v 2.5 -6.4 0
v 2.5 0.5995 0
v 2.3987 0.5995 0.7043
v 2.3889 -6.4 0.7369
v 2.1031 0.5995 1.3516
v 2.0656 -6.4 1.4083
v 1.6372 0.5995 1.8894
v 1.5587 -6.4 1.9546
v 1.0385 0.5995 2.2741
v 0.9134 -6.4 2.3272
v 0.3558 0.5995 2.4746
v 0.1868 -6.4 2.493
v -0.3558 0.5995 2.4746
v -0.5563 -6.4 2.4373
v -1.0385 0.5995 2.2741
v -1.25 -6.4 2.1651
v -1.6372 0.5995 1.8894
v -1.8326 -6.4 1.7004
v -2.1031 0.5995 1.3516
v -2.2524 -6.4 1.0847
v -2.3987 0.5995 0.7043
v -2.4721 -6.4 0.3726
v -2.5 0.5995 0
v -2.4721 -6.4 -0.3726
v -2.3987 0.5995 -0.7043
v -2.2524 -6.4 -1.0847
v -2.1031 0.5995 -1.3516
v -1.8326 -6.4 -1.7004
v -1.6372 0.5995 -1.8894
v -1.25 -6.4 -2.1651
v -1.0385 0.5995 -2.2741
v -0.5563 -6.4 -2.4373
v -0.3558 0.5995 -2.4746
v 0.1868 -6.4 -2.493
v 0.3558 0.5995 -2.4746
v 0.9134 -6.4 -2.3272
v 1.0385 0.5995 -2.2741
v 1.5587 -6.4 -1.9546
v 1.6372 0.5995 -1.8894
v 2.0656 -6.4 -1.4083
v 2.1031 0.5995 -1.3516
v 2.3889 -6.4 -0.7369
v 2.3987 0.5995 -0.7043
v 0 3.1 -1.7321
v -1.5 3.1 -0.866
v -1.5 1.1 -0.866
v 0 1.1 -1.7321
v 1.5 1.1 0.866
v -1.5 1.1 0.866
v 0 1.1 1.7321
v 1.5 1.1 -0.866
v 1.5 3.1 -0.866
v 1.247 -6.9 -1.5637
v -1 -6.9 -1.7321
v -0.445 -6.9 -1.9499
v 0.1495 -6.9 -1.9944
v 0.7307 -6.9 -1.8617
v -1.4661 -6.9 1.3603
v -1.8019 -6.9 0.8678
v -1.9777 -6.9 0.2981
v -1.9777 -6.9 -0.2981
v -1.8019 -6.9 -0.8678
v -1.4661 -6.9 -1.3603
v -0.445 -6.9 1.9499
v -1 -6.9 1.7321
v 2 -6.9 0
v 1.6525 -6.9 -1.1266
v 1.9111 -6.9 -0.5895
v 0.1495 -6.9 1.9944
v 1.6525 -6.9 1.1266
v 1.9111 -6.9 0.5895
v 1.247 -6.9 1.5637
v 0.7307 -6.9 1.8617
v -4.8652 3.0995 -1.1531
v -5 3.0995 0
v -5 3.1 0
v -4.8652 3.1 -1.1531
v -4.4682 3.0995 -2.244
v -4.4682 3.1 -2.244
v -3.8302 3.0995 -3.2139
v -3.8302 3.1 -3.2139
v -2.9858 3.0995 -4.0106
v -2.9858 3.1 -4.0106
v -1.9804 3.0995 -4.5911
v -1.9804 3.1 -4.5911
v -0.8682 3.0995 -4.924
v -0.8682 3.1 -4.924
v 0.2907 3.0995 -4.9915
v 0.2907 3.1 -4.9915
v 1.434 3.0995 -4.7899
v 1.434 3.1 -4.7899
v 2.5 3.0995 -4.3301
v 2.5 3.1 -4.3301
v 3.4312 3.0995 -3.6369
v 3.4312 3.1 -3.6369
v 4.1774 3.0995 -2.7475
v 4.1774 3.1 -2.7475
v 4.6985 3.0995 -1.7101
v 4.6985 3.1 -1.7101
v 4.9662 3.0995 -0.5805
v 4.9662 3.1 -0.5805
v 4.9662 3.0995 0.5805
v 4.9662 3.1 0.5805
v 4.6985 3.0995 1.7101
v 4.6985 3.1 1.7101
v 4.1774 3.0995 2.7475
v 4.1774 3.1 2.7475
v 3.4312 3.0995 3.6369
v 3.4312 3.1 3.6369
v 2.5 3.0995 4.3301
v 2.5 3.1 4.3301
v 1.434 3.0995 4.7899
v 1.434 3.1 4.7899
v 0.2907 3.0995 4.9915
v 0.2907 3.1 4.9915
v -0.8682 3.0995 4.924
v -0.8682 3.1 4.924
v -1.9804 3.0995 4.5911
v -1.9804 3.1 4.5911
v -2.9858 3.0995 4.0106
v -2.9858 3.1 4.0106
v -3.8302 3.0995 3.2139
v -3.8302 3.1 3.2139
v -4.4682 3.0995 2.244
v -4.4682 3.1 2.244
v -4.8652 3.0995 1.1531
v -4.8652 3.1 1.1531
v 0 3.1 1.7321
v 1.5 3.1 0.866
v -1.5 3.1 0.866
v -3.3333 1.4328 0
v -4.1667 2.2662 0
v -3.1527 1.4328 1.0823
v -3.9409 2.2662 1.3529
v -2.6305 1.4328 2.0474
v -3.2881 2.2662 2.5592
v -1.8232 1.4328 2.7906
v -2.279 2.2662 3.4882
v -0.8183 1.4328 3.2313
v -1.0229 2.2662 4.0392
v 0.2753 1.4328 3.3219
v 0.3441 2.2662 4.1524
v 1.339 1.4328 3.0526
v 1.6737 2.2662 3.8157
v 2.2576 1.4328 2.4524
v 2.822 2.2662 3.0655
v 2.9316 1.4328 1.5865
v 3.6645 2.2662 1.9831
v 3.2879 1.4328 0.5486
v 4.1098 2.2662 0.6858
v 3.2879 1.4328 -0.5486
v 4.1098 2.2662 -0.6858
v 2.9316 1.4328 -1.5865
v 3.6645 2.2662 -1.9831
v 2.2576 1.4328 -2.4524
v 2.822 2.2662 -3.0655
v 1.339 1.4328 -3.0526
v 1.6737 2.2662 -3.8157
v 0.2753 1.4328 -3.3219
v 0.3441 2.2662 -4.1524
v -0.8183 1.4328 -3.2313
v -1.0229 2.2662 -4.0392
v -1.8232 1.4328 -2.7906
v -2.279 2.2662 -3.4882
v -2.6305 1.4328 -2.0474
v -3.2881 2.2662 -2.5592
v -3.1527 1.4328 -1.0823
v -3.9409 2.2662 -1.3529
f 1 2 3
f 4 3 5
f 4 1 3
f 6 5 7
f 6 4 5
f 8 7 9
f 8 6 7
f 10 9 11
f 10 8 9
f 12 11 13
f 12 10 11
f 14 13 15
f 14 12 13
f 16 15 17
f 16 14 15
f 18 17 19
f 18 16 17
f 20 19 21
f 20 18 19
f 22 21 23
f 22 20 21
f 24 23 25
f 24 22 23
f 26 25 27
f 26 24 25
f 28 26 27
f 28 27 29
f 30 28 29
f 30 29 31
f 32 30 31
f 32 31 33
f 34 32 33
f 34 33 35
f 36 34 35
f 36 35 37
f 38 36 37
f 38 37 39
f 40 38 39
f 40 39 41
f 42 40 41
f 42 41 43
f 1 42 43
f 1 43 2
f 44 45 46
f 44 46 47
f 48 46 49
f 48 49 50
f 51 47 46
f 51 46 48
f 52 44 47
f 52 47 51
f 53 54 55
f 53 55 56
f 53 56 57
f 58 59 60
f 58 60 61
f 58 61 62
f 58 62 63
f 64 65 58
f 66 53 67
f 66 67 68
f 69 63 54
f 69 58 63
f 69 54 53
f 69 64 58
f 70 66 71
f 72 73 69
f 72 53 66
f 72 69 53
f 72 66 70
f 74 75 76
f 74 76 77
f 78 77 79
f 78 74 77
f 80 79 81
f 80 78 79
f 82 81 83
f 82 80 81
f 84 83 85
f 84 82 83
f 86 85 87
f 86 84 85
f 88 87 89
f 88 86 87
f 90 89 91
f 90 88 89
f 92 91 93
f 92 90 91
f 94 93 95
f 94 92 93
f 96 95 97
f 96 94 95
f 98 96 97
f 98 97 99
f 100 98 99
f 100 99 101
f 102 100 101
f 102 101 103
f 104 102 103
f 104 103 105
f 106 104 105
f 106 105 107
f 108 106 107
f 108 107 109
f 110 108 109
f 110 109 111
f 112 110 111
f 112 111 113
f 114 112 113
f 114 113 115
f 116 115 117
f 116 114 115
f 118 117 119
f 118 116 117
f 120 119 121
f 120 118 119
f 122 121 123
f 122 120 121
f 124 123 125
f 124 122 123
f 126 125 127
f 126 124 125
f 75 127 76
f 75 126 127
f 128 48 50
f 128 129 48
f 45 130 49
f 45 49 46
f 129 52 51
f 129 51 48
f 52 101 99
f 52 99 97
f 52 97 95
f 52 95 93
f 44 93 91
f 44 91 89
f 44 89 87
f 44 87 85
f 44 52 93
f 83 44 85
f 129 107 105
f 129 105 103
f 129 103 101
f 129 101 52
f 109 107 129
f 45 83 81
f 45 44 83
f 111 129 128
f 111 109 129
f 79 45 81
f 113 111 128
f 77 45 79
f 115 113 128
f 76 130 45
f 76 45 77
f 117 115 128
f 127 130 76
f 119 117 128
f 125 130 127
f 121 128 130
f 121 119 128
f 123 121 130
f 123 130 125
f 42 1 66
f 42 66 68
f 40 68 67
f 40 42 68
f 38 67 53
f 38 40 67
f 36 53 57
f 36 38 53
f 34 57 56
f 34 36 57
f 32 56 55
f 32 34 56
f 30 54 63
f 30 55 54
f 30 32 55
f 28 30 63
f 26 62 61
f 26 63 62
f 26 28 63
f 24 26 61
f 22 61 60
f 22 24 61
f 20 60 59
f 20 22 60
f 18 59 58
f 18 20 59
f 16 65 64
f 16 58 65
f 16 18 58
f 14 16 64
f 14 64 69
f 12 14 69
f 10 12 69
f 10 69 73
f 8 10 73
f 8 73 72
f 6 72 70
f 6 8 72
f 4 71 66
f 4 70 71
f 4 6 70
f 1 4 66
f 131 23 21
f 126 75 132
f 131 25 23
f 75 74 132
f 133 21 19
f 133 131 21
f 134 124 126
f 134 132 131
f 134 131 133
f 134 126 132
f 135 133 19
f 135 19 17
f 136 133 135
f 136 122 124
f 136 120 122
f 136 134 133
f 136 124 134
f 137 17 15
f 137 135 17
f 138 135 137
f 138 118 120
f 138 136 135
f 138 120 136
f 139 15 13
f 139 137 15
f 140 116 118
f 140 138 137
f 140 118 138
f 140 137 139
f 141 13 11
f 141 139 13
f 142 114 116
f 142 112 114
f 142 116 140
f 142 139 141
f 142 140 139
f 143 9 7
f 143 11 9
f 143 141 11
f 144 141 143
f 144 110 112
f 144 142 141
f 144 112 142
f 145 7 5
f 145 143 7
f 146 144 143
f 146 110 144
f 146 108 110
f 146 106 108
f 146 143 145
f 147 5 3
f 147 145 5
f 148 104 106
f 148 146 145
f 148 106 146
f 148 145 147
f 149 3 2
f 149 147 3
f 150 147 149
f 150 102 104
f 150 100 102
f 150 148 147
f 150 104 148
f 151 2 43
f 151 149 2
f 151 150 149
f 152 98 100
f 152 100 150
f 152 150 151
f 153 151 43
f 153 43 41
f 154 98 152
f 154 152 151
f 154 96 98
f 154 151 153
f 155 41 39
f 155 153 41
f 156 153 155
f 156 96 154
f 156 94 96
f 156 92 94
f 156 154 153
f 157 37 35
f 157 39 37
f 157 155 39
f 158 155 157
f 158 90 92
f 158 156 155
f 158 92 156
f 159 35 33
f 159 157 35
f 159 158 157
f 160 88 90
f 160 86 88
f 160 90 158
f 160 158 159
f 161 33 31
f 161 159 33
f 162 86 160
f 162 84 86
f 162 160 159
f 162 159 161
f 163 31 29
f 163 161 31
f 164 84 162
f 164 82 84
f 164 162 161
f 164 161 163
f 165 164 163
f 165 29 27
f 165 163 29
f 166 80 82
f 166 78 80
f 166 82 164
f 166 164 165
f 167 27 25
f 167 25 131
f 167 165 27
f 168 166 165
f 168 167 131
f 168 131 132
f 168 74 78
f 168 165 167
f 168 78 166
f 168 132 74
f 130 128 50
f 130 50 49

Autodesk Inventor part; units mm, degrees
ref_plane "YZ Plane" through (0, 0, 0) normal (1, 0, 0) x (0, 1, 0)
ref_plane "XZ Plane" through (0, 0, 0) normal (0, 1, 0) x (-1, 0, 0)
ref_plane "XY Plane" through (0, 0, 0) normal (0, 0, 1) x (1, 0, 0)
sketch "Sketch1" plane through (0, 0, 0) normal (0, 1, 0) x (-1, 0, 0)
  circle A0 centre (0, 0) radius 5
  dimension "d0" = 10
extrude "Extrusion1" add sketch "Sketch1" along normal blind 3.1
chamfer "Chamfer1" distance 3.1 angle 45 1 edges at (5, 0, 0)
sketch "Sketch2" plane through (0, 0, 0) normal (0, -1, 0) x (1, 0, 0)
  circle A0 centre (0, 0) radius 1.9 projected
  circle A1 centre (0, 0) radius 2.5
  dimension "d7" = 5
extrude "Extrusion2" add sketch "Sketch2" along normal blind 6.9 and the other way blind 1 contours A0 | A1
chamfer "Chamfer2" distance 0.5 angle 45 1 edges at (-2.5, -6.9, 0)
sketch "Sketch3" plane through (0, 3.1, 0) normal (0, 1, 0) x (1, 0, 0)
  circle A0 centre (0, 0) radius 5 projected
  line L0 (0, 1.7321) -> (1.5, 0.866)
  line L1 (1.5, 0.866) -> (1.5, -0.866)
  line L2 (1.5, -0.866) -> (0, -1.7321)
  line L3 (0, -1.7321) -> (-1.5, -0.866)
  line L4 (-1.5, -0.866) -> (-1.5, 0.866)
  line L5 (-1.5, 0.866) -> (0, 1.7321)
  dimension "d15" = 3
extrude "Extrusion3" cut sketch "Sketch3" against normal blind 2 contours L0 L1 L2 L3 L4 L5
thread "Thread1" size "M5x0.8" class "6g" standard "ANSI Metric M Profile" full length
properties part number "M5x10FHS"
